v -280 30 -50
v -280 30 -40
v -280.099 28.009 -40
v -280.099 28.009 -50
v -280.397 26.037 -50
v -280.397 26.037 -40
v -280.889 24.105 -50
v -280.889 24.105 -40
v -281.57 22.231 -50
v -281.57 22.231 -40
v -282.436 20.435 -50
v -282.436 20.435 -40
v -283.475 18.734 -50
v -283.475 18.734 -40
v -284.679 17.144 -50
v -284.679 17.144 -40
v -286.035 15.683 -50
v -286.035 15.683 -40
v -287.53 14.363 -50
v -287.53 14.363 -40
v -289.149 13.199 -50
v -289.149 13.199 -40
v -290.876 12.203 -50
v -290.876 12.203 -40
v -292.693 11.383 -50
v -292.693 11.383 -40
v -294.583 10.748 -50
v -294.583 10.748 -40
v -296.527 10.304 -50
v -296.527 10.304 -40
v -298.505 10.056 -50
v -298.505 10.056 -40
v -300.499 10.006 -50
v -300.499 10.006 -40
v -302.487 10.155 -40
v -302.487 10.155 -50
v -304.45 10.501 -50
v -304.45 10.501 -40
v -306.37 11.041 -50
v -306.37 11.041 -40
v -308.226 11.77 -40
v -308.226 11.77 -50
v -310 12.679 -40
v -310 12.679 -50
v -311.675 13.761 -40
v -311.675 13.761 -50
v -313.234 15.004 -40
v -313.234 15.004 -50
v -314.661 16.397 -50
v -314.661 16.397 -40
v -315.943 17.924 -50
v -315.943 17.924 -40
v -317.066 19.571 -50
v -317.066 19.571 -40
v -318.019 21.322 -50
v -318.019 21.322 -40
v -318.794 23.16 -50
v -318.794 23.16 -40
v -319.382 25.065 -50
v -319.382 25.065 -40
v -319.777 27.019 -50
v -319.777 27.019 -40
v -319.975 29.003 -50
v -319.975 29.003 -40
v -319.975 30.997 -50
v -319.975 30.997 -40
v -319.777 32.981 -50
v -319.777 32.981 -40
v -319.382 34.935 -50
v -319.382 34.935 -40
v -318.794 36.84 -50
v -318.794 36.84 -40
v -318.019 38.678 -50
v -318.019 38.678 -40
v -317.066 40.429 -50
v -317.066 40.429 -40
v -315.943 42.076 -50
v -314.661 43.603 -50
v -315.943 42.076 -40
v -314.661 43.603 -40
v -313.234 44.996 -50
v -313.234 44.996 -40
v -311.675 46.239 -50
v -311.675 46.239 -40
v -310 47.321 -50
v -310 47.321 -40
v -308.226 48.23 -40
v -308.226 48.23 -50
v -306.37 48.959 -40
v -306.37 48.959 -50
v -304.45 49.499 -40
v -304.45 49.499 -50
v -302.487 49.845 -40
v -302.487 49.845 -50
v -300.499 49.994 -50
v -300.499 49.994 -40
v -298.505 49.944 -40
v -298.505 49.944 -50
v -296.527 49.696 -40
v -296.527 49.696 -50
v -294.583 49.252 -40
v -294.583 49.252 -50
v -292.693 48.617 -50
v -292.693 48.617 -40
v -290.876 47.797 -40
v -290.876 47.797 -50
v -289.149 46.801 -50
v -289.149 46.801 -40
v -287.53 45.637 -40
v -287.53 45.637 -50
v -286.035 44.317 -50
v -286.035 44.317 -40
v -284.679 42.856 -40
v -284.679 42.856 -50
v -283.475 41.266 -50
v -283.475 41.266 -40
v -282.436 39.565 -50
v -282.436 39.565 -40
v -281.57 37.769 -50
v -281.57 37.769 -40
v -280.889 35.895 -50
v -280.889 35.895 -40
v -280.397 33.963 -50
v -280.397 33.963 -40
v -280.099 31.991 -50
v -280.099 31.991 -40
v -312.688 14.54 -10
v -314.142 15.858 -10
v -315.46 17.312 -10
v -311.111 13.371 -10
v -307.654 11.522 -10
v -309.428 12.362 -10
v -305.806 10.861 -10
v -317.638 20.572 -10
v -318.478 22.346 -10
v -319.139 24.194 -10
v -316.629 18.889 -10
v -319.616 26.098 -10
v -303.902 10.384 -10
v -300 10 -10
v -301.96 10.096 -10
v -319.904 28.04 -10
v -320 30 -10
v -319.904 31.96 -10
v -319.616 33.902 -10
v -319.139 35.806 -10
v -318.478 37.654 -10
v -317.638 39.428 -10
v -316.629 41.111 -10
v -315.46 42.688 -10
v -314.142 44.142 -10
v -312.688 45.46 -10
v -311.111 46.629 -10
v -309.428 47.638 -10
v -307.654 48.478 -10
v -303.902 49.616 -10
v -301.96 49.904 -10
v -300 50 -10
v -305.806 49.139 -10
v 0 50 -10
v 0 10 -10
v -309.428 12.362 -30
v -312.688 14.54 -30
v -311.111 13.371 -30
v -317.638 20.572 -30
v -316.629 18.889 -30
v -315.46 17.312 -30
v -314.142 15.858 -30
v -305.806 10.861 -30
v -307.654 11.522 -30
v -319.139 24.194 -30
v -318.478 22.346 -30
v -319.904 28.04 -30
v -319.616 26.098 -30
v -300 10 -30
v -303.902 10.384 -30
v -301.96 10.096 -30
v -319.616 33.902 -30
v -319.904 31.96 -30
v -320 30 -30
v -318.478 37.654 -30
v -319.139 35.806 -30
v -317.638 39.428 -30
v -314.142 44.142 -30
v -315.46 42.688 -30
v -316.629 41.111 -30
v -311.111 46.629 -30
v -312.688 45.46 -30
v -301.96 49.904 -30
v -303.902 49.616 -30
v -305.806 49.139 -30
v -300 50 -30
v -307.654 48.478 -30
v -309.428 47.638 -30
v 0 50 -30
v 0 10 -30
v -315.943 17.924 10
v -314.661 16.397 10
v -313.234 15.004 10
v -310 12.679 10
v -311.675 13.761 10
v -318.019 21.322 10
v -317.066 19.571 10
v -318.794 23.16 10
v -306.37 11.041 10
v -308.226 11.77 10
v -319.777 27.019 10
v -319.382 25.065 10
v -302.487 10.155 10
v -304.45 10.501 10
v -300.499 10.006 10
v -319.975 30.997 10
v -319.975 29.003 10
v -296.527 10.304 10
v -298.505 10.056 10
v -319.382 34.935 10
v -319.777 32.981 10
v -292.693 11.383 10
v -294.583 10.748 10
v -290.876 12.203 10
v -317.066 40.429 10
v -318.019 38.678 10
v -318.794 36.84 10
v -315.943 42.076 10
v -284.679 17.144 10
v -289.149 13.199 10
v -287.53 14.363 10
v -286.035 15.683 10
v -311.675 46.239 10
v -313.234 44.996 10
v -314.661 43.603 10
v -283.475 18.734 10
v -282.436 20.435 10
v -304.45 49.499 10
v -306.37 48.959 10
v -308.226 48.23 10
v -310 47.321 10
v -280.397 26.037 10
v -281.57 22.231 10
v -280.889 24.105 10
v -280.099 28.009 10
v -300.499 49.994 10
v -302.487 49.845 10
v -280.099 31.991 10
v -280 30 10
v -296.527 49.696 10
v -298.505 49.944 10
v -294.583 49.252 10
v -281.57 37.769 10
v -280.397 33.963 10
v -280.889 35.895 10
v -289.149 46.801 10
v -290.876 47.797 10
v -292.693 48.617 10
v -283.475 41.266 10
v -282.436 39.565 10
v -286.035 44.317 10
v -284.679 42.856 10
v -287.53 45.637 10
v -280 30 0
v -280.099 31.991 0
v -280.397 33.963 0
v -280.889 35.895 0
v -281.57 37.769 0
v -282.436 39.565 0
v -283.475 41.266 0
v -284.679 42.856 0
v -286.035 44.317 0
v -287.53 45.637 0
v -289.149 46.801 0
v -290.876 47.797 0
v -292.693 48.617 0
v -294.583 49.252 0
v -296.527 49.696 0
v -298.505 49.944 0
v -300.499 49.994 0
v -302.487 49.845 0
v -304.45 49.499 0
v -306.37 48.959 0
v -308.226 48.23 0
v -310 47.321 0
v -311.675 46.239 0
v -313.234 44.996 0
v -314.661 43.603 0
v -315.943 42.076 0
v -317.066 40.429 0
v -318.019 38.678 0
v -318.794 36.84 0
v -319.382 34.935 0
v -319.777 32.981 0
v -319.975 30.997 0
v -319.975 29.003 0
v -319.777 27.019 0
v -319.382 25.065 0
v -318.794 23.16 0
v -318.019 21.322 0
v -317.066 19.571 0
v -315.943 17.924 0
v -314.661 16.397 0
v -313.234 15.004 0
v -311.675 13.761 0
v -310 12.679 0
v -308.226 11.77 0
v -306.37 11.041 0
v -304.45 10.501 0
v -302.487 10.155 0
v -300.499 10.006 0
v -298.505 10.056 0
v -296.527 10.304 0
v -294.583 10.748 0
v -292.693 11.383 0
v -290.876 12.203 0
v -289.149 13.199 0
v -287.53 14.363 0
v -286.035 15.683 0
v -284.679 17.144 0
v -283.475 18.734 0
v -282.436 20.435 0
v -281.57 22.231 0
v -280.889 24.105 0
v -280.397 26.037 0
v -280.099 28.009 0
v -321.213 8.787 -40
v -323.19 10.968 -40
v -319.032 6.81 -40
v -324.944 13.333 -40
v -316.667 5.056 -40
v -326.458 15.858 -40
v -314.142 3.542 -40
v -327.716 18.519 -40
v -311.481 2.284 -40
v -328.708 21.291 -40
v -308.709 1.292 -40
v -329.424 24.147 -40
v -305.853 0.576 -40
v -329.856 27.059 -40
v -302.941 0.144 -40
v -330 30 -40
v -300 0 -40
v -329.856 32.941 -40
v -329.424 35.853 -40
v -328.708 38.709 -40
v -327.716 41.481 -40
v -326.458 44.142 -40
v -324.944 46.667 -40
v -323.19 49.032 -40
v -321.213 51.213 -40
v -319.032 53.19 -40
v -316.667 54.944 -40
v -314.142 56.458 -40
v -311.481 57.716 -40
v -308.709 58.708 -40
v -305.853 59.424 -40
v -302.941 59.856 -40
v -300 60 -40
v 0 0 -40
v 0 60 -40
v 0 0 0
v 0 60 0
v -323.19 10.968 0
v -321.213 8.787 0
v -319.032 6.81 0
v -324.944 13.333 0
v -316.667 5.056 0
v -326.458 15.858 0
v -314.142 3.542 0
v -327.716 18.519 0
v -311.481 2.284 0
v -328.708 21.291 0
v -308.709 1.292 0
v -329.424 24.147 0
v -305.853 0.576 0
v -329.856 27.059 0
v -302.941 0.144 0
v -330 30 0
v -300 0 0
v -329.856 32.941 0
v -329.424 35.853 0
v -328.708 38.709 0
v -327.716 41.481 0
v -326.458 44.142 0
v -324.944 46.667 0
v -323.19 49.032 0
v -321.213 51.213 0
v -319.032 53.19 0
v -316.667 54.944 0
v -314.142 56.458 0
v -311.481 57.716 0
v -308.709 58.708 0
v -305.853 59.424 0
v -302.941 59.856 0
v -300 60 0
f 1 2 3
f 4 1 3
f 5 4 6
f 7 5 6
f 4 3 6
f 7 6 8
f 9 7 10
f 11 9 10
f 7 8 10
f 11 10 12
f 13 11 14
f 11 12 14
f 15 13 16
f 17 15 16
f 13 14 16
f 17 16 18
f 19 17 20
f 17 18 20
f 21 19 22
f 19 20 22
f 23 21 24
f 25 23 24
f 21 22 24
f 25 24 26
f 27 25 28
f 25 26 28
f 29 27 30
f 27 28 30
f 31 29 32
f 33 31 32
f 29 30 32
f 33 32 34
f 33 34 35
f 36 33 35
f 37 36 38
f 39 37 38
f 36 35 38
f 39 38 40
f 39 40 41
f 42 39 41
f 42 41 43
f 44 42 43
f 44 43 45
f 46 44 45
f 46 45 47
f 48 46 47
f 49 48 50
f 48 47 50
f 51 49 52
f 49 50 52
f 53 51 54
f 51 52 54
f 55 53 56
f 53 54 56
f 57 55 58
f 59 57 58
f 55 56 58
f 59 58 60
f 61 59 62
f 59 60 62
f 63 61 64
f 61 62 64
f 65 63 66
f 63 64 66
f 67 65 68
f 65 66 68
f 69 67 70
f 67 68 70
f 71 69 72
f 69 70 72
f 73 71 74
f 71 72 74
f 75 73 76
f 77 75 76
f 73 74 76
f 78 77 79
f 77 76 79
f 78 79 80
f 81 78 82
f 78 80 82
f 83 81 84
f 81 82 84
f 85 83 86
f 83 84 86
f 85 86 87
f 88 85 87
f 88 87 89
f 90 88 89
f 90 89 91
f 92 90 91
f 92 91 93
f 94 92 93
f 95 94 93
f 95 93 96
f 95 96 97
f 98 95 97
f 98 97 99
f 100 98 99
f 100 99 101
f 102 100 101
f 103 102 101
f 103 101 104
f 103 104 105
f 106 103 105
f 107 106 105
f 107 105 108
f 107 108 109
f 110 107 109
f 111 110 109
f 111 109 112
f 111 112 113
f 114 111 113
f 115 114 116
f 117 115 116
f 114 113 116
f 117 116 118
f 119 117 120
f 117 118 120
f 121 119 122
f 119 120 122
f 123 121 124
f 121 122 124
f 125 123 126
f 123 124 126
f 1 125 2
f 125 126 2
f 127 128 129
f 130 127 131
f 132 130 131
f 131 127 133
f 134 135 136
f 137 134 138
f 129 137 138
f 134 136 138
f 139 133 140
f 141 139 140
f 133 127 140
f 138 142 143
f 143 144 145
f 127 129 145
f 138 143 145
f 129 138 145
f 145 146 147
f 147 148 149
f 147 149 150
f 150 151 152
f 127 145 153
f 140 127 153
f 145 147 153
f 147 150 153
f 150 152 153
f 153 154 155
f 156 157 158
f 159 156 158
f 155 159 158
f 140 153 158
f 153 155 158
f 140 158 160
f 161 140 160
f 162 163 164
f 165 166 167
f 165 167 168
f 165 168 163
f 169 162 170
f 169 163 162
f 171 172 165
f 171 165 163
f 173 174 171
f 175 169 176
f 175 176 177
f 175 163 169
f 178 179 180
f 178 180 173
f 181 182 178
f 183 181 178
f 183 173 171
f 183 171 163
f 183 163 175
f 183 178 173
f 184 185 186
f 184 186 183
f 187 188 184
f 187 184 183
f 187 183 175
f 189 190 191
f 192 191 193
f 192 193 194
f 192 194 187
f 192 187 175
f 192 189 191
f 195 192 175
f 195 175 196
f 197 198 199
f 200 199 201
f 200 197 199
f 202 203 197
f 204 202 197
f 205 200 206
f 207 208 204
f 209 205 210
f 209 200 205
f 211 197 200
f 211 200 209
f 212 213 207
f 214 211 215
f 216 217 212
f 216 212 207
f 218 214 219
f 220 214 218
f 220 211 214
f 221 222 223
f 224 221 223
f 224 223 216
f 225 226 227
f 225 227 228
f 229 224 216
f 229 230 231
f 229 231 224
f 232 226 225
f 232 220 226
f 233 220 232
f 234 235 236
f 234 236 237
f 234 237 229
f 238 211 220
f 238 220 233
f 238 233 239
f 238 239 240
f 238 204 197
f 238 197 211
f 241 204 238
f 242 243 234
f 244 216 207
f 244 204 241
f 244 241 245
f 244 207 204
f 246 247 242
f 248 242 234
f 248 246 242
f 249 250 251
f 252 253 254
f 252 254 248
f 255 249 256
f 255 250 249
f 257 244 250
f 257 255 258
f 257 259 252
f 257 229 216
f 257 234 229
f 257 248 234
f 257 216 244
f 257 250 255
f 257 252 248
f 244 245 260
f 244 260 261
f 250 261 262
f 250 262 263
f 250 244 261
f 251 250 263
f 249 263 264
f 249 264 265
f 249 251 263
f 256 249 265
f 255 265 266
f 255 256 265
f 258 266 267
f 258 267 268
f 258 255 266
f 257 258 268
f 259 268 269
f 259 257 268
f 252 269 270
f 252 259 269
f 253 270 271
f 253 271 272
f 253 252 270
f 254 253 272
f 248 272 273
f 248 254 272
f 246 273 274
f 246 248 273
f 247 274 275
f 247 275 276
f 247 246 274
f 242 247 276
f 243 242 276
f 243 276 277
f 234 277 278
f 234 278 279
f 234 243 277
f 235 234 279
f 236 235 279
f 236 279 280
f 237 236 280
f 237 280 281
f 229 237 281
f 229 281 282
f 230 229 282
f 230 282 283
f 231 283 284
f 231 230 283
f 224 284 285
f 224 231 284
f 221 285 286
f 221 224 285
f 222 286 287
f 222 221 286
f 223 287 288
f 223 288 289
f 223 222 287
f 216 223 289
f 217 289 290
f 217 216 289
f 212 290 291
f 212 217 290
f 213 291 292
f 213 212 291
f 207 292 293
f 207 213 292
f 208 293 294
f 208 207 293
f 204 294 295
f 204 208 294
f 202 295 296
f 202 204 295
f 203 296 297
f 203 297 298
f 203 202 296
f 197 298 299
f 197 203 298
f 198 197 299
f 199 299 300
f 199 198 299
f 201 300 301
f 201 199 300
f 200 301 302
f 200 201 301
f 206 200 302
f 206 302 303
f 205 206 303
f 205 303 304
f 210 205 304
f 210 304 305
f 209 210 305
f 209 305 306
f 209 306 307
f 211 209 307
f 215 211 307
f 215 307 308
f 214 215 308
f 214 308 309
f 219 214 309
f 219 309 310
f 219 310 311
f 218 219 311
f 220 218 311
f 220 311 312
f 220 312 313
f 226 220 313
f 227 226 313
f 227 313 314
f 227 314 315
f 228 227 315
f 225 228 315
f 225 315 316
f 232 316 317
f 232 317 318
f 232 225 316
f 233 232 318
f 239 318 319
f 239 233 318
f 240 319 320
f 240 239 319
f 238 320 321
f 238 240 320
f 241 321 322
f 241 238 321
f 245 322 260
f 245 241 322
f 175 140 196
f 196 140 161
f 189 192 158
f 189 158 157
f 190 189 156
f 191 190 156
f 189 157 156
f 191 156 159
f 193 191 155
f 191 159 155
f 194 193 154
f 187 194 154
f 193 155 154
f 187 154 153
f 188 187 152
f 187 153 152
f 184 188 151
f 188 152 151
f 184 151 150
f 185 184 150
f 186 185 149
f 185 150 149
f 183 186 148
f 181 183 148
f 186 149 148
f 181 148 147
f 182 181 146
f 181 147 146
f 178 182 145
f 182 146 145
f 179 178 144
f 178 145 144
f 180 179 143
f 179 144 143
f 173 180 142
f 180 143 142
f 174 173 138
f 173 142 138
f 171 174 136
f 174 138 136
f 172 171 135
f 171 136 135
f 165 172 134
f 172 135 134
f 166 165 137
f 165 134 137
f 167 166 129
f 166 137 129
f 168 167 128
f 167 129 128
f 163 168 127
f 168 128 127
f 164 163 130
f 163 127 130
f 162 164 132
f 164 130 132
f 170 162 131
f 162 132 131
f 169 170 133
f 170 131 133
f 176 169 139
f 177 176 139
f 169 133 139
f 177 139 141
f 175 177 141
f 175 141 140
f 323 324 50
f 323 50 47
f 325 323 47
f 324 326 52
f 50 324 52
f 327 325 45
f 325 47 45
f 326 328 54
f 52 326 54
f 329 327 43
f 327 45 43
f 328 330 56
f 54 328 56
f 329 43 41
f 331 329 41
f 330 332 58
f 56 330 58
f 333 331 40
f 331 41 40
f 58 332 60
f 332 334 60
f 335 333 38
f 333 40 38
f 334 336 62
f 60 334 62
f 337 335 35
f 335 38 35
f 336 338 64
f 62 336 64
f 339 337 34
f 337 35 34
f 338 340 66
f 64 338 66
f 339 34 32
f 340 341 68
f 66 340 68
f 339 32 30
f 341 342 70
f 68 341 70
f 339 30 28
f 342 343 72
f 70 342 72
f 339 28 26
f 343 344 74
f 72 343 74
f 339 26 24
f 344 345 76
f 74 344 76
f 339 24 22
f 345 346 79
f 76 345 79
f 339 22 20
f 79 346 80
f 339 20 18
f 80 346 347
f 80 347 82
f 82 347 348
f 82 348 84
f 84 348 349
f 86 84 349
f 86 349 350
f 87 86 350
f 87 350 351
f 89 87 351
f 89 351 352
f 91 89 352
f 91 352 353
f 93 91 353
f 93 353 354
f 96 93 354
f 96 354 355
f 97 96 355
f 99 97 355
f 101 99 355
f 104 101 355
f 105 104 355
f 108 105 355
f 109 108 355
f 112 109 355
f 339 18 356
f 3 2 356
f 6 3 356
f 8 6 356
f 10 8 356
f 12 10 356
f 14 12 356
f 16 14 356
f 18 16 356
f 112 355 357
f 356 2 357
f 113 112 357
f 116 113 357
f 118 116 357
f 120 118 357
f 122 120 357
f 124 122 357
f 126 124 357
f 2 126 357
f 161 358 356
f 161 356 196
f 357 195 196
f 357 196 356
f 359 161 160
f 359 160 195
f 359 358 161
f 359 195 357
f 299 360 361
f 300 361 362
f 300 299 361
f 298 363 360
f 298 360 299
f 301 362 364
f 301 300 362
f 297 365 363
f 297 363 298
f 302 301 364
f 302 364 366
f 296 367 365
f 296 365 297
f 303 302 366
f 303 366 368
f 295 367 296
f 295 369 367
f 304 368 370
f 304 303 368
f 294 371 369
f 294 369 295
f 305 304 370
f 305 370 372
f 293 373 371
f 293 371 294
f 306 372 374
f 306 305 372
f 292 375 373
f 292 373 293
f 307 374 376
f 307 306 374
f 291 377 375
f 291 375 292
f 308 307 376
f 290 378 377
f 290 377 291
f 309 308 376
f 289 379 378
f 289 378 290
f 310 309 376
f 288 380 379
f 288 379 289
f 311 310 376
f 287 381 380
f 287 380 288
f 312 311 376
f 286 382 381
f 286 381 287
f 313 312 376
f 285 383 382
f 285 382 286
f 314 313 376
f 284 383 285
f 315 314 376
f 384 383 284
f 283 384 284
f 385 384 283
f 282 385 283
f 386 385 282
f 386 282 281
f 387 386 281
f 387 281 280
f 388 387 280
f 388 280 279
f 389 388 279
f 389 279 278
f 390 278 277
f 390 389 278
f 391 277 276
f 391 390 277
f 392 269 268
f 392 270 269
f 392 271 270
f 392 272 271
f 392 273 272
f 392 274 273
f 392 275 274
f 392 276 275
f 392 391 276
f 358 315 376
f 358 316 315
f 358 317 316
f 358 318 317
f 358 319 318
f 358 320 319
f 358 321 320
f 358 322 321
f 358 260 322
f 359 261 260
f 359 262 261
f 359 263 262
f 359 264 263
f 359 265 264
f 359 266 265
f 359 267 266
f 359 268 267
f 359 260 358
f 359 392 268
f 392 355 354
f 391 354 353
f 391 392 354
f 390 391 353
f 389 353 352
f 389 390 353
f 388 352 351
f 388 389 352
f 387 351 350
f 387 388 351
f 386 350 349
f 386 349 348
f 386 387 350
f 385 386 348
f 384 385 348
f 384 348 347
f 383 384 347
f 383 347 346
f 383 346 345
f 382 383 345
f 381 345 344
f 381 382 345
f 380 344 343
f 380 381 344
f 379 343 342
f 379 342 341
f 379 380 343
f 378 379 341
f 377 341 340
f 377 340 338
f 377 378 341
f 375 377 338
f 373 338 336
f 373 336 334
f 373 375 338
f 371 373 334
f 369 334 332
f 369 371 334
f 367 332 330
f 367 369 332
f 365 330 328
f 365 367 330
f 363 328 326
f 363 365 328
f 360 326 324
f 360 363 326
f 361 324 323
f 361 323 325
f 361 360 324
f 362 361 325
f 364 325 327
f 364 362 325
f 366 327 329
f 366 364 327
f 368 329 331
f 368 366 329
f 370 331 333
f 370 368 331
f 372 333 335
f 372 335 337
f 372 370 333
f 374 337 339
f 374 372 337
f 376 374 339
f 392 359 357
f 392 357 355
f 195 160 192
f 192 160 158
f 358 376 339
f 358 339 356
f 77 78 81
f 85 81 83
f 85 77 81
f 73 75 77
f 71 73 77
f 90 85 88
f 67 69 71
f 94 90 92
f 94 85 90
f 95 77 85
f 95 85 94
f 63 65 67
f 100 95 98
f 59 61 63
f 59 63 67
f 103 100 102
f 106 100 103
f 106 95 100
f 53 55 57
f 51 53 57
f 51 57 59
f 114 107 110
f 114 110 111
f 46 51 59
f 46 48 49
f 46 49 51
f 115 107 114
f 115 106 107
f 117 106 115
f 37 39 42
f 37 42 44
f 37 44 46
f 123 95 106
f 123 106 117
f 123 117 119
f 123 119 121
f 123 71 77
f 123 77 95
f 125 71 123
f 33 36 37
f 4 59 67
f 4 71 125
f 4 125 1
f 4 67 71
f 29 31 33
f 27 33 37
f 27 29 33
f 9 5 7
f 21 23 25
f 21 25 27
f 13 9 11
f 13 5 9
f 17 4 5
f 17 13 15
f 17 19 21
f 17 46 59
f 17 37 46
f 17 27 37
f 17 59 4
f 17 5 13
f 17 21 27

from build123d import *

# Parameters (mm, degrees)
BOSS_EXTRUDE1_DEPTH = 40
SHELL1_T            = -10
BOSS_EXTRUDE2_START = 10
SKETCH1_3_R         = 20
BOSS_EXTRUDE2_DEPTH = 10
SKETCH2_R           = 20
BOSS_EXTRUDE3_DEPTH = 10


with BuildPart() as part:
    # Sketch1 → Boss-Extrude1 (new body)
    with BuildSketch(Plane.XY):
        with BuildLine():
            Line((-300, 0), (0, 0))
            Line((0, 0), (0, 60))
            Line((0, 60), (-300, 60))
            ThreePointArc((-300, 60), (-330, 30), (-300, 0))
        make_face()
    extrude(amount=-BOSS_EXTRUDE1_DEPTH)

    # Shell1
    shell1_openings = [part.faces().sort_by_distance(p)[0] for p in [
        (0, 30, -20),
    ]]
    offset(amount=SHELL1_T, openings=shell1_openings, kind=Kind.INTERSECTION)

    # Sketch1<3> → Boss-Extrude2 (add)
    with BuildSketch(Plane.XY.offset(BOSS_EXTRUDE2_START)):
        with Locations((-300, 30)):
            Circle(SKETCH1_3_R)
    extrude(amount=-BOSS_EXTRUDE2_DEPTH)

    # Sketch2 → Boss-Extrude3 (add)
    with BuildSketch(Plane(origin=(0, 0, -40), x_dir=(-1, 0, 0), z_dir=(0, 0, -1))):
        with Locations((300, 30)):
            Circle(SKETCH2_R)
    extrude(amount=BOSS_EXTRUDE3_DEPTH)


solid = part.part
